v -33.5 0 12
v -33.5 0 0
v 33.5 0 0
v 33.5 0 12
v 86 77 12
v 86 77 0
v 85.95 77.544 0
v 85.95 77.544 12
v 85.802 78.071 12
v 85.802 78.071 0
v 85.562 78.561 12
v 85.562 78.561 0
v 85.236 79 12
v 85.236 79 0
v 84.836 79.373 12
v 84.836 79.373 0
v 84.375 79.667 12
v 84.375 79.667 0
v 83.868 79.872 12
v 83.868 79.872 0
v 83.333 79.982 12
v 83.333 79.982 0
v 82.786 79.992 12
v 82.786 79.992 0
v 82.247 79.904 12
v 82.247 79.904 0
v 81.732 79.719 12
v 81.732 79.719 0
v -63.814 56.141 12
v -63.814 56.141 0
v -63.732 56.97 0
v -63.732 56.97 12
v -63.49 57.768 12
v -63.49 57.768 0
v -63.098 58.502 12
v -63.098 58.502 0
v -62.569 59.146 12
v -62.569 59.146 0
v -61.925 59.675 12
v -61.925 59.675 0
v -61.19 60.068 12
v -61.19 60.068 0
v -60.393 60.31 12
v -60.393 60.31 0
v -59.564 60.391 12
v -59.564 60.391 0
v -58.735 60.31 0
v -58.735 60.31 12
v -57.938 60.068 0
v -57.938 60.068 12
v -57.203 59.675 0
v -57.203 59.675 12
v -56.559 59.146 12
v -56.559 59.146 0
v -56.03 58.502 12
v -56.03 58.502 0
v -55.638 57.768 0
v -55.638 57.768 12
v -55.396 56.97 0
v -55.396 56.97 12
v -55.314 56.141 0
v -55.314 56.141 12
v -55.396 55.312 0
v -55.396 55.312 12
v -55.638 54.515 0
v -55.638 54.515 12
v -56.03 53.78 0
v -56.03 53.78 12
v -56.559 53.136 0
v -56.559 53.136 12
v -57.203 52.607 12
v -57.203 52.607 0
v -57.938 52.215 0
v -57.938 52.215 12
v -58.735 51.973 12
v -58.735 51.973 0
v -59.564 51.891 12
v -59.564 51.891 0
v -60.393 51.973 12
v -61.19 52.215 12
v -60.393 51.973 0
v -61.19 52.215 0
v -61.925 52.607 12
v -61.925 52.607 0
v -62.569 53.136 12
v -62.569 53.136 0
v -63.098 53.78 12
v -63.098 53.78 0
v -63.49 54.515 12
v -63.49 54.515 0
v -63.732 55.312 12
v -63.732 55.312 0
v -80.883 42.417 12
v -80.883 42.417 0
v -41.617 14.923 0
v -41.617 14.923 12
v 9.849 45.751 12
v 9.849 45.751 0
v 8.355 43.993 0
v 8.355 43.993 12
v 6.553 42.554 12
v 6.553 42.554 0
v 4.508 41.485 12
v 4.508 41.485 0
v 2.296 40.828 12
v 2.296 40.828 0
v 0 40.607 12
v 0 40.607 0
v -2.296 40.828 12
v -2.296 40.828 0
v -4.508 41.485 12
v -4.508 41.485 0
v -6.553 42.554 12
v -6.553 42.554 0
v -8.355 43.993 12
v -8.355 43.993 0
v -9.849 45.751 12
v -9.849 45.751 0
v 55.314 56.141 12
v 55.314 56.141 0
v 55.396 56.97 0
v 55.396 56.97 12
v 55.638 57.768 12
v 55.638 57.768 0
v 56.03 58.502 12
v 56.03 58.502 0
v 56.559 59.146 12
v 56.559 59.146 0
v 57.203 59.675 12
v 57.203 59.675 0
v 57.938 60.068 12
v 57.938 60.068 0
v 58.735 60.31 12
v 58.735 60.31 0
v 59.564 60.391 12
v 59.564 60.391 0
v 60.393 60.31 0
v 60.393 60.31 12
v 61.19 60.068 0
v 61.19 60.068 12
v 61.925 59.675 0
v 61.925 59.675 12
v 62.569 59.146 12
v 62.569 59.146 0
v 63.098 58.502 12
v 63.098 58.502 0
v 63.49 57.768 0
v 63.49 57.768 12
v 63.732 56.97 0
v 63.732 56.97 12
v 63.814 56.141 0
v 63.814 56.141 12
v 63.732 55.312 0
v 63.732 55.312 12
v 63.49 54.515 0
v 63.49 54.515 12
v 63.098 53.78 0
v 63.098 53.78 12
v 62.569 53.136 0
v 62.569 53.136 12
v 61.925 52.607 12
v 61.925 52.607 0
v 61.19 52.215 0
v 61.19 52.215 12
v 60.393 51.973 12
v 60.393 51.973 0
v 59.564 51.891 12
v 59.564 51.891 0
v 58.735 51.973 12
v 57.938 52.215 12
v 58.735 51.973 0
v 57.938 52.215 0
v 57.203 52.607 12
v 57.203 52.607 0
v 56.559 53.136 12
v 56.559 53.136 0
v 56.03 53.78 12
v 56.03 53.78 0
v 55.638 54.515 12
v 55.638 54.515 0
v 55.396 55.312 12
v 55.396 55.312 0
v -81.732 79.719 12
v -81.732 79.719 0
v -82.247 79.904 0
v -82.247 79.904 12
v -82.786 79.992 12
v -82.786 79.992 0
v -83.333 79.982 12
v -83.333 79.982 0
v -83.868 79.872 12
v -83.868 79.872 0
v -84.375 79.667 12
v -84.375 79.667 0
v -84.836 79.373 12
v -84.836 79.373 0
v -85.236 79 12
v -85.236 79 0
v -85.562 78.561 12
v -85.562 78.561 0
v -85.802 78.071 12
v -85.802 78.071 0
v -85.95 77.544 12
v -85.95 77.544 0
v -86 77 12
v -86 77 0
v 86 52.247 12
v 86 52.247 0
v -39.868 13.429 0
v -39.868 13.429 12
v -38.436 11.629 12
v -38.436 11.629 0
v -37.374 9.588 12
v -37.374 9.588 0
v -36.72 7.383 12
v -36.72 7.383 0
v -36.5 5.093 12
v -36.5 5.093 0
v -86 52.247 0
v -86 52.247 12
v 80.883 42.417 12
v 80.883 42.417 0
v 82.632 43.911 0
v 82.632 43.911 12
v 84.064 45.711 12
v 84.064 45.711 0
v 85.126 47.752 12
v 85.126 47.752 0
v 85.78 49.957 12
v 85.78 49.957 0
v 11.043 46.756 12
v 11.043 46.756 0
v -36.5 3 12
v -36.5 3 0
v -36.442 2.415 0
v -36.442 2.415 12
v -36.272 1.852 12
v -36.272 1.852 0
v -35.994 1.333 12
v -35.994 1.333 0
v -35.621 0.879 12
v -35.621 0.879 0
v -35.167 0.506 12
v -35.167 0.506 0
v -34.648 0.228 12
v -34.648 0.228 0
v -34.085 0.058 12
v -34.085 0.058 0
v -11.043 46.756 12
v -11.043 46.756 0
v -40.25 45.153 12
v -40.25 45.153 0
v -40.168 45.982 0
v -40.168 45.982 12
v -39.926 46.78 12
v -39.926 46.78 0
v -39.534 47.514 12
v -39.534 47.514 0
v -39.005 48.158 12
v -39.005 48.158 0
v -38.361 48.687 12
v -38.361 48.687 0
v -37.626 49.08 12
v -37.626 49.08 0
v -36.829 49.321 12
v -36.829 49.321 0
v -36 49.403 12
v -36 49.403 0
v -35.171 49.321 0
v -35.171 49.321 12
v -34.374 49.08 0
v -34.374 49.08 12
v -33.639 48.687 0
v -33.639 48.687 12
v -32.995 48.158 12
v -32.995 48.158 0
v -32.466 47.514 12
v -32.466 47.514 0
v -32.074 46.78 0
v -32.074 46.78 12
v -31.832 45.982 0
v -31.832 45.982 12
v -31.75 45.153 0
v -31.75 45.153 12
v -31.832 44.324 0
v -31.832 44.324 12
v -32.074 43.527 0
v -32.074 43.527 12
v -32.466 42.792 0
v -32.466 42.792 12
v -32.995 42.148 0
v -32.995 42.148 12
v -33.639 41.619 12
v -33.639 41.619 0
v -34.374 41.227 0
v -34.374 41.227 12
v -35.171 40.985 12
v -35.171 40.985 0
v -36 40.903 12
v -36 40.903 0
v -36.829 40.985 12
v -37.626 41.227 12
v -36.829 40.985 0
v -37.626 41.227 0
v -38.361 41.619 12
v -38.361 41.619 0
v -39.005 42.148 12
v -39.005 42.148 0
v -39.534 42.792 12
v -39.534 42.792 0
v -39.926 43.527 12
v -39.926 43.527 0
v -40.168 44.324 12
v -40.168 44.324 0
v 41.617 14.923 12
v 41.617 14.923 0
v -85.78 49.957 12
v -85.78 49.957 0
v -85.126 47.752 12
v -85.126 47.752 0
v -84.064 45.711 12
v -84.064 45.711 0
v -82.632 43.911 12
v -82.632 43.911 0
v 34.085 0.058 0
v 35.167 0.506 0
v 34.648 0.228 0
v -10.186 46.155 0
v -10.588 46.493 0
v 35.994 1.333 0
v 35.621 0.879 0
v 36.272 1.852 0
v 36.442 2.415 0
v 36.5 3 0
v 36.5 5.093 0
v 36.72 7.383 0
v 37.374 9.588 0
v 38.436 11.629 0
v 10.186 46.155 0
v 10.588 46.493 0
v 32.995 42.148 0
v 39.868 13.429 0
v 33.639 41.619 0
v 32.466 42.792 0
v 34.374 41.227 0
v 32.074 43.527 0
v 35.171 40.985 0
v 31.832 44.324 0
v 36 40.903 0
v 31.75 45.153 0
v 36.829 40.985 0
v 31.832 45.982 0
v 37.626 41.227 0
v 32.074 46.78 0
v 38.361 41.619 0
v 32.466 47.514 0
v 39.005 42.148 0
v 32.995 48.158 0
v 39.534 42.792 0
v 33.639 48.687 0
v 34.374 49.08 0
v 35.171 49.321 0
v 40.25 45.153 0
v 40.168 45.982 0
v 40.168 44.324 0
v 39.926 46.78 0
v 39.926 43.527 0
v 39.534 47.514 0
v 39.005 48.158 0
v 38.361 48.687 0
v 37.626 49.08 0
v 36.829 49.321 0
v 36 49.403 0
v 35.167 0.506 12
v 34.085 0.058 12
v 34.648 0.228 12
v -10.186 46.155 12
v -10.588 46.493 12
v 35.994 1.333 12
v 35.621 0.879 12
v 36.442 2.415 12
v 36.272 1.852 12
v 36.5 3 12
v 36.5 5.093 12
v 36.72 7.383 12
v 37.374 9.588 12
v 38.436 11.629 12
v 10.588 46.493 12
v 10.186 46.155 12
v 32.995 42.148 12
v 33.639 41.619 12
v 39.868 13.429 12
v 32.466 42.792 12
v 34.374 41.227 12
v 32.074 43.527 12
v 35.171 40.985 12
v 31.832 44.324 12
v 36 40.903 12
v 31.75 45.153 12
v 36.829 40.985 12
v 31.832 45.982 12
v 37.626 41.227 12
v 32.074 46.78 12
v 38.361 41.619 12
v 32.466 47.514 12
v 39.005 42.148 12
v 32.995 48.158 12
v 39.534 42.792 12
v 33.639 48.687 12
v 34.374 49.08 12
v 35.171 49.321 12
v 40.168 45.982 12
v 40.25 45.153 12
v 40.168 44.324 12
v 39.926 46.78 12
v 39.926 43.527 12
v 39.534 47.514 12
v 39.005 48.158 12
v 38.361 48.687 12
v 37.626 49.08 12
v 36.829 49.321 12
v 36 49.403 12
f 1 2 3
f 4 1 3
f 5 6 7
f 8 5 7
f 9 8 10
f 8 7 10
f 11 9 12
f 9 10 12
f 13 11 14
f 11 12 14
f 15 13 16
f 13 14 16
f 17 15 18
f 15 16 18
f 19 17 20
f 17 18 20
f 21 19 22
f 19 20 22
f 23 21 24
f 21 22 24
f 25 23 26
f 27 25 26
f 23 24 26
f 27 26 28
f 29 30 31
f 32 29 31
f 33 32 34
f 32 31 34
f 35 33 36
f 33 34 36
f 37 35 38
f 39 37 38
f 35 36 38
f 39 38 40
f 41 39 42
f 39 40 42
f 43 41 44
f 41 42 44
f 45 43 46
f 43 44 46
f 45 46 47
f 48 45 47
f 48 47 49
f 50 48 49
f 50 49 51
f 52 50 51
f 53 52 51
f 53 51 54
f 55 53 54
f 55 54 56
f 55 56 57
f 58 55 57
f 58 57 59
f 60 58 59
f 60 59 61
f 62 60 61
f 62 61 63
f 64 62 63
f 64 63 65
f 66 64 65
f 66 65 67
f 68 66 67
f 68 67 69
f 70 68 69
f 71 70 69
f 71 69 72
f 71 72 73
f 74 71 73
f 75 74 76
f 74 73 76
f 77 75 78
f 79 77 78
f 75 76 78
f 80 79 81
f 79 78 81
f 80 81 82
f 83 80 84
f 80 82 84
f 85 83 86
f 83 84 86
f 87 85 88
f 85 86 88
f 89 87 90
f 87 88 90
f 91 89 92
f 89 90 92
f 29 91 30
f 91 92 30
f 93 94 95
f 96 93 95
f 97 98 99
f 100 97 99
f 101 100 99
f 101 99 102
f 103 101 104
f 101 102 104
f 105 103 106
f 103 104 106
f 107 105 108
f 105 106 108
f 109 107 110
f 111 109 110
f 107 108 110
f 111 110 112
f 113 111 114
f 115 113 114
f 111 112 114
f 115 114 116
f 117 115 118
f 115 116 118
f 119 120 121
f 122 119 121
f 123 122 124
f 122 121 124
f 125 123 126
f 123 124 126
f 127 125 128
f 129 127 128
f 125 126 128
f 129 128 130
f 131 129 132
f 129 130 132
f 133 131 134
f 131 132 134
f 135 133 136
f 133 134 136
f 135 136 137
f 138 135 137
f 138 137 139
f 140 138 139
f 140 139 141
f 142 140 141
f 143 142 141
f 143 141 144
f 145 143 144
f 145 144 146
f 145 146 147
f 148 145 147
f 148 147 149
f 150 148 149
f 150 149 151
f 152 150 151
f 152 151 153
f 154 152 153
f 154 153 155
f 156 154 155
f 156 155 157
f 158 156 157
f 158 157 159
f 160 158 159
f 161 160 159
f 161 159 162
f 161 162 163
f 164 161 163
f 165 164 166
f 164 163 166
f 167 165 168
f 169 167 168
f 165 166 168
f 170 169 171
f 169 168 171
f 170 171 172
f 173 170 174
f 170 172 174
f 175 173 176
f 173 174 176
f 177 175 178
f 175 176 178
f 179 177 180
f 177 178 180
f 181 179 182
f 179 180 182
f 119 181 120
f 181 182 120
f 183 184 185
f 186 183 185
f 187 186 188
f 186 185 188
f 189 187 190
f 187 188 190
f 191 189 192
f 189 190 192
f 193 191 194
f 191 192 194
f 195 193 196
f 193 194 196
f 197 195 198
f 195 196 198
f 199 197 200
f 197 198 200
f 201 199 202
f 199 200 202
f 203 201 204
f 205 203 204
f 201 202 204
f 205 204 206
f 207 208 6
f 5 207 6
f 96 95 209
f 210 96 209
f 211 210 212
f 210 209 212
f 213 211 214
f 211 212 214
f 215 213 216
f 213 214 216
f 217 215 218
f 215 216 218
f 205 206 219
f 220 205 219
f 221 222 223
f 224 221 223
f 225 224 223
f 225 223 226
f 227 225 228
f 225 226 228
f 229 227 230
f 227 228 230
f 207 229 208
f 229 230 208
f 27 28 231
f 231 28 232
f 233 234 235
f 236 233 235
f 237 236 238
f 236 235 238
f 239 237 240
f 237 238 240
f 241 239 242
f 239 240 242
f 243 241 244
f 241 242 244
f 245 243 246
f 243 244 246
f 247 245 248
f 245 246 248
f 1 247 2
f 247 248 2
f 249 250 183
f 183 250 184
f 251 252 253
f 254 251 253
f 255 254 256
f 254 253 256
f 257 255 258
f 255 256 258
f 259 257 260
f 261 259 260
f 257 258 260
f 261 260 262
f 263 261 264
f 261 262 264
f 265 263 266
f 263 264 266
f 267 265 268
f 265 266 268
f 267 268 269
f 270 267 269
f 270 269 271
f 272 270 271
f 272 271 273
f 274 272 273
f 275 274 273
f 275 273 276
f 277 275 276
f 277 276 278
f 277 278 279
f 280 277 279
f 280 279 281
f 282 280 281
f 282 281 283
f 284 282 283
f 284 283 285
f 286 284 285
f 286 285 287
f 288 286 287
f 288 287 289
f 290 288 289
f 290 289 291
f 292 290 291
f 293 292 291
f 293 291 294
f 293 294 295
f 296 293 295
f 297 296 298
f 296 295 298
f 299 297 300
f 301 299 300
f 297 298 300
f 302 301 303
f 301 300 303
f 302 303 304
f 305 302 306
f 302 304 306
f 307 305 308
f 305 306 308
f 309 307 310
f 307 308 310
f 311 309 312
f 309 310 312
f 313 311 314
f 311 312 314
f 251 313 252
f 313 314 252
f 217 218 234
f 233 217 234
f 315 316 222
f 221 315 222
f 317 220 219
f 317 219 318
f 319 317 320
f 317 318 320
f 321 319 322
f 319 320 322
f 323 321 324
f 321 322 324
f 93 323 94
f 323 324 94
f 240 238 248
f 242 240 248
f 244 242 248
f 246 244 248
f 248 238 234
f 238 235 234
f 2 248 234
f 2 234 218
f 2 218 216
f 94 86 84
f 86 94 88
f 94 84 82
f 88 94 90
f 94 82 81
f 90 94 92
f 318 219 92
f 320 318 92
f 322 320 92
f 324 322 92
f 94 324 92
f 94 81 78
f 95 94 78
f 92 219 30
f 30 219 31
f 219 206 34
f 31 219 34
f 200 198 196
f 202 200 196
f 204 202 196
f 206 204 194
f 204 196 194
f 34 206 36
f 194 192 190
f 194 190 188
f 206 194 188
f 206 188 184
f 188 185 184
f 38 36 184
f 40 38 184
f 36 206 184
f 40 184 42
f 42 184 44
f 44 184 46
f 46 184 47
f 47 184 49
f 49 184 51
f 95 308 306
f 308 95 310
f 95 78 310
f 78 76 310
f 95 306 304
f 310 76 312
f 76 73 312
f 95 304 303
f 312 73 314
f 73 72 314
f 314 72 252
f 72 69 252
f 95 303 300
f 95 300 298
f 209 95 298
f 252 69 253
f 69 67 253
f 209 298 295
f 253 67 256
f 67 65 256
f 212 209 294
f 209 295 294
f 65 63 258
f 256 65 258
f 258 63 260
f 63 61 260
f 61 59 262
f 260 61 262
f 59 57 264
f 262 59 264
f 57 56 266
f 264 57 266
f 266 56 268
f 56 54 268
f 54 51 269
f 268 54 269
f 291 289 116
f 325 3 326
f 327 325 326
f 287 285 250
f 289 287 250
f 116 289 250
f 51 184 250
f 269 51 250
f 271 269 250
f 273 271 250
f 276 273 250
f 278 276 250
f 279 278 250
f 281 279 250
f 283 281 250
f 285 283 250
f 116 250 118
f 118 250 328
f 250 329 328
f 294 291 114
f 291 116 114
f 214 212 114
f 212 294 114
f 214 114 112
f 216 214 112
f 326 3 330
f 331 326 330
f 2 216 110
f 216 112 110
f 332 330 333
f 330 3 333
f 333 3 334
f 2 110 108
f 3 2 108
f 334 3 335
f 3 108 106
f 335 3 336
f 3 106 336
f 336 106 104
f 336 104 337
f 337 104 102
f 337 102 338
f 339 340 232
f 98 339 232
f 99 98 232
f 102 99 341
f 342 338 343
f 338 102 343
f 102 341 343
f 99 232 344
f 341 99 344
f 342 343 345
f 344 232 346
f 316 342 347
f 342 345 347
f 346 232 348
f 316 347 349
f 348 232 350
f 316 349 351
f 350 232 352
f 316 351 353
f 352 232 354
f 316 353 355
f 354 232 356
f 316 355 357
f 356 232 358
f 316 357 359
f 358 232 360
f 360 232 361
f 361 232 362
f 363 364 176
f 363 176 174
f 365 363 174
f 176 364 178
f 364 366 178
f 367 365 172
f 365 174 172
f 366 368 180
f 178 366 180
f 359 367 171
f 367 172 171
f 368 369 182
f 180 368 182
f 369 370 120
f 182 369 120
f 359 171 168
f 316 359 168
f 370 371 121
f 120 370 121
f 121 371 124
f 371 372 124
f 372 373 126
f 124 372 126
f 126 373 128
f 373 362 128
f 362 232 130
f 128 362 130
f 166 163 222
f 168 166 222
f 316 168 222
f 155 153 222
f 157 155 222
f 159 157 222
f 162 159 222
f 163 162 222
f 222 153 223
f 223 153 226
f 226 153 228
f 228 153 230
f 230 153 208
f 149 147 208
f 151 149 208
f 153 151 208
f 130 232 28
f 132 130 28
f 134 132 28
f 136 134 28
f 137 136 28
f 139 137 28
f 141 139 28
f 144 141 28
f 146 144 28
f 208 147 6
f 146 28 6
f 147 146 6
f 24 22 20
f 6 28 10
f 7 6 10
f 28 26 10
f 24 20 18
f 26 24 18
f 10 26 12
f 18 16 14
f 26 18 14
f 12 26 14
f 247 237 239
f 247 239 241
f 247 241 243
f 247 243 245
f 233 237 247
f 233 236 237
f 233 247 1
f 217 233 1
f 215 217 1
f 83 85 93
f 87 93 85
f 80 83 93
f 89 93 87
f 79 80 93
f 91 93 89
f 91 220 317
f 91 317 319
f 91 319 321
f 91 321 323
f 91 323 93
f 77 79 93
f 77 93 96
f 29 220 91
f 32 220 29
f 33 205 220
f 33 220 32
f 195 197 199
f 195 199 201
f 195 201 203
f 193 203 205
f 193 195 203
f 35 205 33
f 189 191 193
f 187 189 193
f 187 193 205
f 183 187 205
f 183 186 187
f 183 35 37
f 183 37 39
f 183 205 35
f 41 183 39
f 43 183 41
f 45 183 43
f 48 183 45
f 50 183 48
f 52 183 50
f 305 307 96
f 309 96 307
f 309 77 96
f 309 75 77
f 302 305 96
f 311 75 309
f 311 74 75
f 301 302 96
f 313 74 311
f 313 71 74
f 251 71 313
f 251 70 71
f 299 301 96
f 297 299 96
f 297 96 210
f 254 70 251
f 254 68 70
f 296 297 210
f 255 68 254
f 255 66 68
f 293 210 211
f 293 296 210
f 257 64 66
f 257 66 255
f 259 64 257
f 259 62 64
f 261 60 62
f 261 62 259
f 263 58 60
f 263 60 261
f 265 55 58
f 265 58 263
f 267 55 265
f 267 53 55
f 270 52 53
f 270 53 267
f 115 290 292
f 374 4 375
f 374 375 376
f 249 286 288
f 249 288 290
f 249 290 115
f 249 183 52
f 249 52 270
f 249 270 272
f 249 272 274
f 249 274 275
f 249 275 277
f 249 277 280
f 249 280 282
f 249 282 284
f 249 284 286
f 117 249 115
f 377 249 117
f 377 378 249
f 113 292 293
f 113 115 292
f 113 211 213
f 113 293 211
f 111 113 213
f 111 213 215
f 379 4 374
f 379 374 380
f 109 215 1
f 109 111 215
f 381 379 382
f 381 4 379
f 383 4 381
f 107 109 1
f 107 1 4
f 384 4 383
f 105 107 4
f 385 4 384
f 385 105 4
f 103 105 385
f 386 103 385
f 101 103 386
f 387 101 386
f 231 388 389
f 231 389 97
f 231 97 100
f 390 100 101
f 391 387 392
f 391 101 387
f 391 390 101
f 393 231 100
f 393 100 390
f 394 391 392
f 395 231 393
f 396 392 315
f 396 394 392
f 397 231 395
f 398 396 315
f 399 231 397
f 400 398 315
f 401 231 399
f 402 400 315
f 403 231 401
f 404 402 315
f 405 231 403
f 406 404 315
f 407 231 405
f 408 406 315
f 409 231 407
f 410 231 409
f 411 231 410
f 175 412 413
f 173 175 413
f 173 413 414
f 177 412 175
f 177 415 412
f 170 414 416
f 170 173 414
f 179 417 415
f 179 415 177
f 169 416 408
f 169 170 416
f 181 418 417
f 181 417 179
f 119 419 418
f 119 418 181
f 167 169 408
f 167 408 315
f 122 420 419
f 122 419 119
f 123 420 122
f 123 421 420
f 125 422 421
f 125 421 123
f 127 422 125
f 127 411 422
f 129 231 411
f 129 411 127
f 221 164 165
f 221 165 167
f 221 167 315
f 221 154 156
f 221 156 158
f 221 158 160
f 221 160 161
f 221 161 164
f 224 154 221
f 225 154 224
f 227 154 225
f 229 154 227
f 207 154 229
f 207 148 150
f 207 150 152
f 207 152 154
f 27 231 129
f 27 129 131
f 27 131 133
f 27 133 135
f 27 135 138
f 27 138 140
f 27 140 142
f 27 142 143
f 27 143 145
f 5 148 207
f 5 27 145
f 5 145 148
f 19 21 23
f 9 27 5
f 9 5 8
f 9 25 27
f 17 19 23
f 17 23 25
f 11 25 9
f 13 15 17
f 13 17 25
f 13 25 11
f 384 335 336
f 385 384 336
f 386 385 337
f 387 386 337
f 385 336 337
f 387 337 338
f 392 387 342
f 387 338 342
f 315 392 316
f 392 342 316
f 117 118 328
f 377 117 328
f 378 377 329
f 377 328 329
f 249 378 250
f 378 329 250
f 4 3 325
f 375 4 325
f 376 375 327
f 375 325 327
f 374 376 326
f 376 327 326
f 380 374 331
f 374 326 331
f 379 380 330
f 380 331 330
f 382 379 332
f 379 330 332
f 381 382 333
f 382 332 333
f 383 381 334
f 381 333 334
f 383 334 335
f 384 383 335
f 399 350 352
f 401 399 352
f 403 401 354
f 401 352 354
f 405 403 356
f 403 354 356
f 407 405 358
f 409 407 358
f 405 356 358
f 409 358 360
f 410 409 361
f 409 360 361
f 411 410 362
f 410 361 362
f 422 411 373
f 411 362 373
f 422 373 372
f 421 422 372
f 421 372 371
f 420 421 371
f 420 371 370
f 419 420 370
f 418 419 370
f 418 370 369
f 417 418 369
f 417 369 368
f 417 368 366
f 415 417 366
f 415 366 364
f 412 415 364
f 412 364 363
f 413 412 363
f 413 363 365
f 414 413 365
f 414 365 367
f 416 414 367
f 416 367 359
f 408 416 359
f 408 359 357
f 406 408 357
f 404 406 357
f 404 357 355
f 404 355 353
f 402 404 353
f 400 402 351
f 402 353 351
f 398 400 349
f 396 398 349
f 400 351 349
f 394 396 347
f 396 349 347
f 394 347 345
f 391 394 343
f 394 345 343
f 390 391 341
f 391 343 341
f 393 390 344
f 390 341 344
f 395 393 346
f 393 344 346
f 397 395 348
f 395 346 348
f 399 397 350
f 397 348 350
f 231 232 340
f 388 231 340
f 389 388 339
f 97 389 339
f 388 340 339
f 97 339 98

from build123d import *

# Parameters (mm, degrees)
EXTRUDE1_DEPTH         = 12
M10_GEVINDHULLER_D     = 8.5
M10_GEVINDHULLER_DEPTH = 22
M10_GEVINDHULLER_TIP   = 2.553657631


with BuildPart() as part:
    # Sketch1 → Extrude1 (new body)
    with BuildSketch(Plane.XY):
        with BuildLine():
            Line((36.5, 3), (36.5, 5.092922252))
            ThreePointArc((36.5, 5.092922252), (37.855870002, 10.633905611), (41.617082764, 14.922746783))
            Line((41.617082764, 14.922746783), (80.882917236, 42.416980075))
            ThreePointArc((80.882917236, 42.416980075), (84.644129998, 46.705821248), (86, 52.246804607))
            Line((86, 52.246804607), (86, 77))
            ThreePointArc((86, 77), (84.611898825, 79.530174337), (81.732145215, 79.718923361))
            Line((81.732145215, 79.718923361), (11.04340479, 46.756222356))
            ThreePointArc((11.04340479, 46.756222356), (10.379689702, 46.332737476), (9.84900766, 45.751158822))
            ThreePointArc((9.84900766, 45.751158822), (0, 40.60659813), (-9.84900766, 45.751158822))
            ThreePointArc((-9.84900766, 45.751158822), (-10.379689702, 46.332737476), (-11.04340479, 46.756222356))
            Line((-11.04340479, 46.756222356), (-81.732145215, 79.718923361))
            ThreePointArc((-81.732145215, 79.718923361), (-84.611898825, 79.530174337), (-86, 77))
            Line((-86, 77), (-86, 52.246804607))
            ThreePointArc((-86, 52.246804607), (-84.644129998, 46.705821248), (-80.882917236, 42.416980075))
            Line((-80.882917236, 42.416980075), (-41.617082764, 14.922746783))
            ThreePointArc((-41.617082764, 14.922746783), (-37.855870002, 10.633905611), (-36.5, 5.092922252))
            Line((-36.5, 5.092922252), (-36.5, 3))
            ThreePointArc((-36.5, 3), (-35.621320344, 0.878679656), (-33.5, 0))
            Line((-33.5, 0), (0, 0))
            Line((0, 0), (33.5, 0))
            ThreePointArc((33.5, 0), (35.621320344, 0.878679656), (36.5, 3))
        make_face()
    extrude(amount=EXTRUDE1_DEPTH)

    # M10 gevindhuller
    with Locations(Plane.XY.offset(12)):
        with Locations((-59.564002463, 56.141213601), (-36, 45.153138796), (59.564002463, 56.141213601), (36, 45.153138796)):
            Hole(M10_GEVINDHULLER_D / 2, depth=M10_GEVINDHULLER_DEPTH)
            with Locations((0, 0, -(M10_GEVINDHULLER_DEPTH + M10_GEVINDHULLER_TIP / 2))):  # 118° drill point
                Cone(0, M10_GEVINDHULLER_D / 2, M10_GEVINDHULLER_TIP, mode=Mode.SUBTRACT)


solid = part.part
